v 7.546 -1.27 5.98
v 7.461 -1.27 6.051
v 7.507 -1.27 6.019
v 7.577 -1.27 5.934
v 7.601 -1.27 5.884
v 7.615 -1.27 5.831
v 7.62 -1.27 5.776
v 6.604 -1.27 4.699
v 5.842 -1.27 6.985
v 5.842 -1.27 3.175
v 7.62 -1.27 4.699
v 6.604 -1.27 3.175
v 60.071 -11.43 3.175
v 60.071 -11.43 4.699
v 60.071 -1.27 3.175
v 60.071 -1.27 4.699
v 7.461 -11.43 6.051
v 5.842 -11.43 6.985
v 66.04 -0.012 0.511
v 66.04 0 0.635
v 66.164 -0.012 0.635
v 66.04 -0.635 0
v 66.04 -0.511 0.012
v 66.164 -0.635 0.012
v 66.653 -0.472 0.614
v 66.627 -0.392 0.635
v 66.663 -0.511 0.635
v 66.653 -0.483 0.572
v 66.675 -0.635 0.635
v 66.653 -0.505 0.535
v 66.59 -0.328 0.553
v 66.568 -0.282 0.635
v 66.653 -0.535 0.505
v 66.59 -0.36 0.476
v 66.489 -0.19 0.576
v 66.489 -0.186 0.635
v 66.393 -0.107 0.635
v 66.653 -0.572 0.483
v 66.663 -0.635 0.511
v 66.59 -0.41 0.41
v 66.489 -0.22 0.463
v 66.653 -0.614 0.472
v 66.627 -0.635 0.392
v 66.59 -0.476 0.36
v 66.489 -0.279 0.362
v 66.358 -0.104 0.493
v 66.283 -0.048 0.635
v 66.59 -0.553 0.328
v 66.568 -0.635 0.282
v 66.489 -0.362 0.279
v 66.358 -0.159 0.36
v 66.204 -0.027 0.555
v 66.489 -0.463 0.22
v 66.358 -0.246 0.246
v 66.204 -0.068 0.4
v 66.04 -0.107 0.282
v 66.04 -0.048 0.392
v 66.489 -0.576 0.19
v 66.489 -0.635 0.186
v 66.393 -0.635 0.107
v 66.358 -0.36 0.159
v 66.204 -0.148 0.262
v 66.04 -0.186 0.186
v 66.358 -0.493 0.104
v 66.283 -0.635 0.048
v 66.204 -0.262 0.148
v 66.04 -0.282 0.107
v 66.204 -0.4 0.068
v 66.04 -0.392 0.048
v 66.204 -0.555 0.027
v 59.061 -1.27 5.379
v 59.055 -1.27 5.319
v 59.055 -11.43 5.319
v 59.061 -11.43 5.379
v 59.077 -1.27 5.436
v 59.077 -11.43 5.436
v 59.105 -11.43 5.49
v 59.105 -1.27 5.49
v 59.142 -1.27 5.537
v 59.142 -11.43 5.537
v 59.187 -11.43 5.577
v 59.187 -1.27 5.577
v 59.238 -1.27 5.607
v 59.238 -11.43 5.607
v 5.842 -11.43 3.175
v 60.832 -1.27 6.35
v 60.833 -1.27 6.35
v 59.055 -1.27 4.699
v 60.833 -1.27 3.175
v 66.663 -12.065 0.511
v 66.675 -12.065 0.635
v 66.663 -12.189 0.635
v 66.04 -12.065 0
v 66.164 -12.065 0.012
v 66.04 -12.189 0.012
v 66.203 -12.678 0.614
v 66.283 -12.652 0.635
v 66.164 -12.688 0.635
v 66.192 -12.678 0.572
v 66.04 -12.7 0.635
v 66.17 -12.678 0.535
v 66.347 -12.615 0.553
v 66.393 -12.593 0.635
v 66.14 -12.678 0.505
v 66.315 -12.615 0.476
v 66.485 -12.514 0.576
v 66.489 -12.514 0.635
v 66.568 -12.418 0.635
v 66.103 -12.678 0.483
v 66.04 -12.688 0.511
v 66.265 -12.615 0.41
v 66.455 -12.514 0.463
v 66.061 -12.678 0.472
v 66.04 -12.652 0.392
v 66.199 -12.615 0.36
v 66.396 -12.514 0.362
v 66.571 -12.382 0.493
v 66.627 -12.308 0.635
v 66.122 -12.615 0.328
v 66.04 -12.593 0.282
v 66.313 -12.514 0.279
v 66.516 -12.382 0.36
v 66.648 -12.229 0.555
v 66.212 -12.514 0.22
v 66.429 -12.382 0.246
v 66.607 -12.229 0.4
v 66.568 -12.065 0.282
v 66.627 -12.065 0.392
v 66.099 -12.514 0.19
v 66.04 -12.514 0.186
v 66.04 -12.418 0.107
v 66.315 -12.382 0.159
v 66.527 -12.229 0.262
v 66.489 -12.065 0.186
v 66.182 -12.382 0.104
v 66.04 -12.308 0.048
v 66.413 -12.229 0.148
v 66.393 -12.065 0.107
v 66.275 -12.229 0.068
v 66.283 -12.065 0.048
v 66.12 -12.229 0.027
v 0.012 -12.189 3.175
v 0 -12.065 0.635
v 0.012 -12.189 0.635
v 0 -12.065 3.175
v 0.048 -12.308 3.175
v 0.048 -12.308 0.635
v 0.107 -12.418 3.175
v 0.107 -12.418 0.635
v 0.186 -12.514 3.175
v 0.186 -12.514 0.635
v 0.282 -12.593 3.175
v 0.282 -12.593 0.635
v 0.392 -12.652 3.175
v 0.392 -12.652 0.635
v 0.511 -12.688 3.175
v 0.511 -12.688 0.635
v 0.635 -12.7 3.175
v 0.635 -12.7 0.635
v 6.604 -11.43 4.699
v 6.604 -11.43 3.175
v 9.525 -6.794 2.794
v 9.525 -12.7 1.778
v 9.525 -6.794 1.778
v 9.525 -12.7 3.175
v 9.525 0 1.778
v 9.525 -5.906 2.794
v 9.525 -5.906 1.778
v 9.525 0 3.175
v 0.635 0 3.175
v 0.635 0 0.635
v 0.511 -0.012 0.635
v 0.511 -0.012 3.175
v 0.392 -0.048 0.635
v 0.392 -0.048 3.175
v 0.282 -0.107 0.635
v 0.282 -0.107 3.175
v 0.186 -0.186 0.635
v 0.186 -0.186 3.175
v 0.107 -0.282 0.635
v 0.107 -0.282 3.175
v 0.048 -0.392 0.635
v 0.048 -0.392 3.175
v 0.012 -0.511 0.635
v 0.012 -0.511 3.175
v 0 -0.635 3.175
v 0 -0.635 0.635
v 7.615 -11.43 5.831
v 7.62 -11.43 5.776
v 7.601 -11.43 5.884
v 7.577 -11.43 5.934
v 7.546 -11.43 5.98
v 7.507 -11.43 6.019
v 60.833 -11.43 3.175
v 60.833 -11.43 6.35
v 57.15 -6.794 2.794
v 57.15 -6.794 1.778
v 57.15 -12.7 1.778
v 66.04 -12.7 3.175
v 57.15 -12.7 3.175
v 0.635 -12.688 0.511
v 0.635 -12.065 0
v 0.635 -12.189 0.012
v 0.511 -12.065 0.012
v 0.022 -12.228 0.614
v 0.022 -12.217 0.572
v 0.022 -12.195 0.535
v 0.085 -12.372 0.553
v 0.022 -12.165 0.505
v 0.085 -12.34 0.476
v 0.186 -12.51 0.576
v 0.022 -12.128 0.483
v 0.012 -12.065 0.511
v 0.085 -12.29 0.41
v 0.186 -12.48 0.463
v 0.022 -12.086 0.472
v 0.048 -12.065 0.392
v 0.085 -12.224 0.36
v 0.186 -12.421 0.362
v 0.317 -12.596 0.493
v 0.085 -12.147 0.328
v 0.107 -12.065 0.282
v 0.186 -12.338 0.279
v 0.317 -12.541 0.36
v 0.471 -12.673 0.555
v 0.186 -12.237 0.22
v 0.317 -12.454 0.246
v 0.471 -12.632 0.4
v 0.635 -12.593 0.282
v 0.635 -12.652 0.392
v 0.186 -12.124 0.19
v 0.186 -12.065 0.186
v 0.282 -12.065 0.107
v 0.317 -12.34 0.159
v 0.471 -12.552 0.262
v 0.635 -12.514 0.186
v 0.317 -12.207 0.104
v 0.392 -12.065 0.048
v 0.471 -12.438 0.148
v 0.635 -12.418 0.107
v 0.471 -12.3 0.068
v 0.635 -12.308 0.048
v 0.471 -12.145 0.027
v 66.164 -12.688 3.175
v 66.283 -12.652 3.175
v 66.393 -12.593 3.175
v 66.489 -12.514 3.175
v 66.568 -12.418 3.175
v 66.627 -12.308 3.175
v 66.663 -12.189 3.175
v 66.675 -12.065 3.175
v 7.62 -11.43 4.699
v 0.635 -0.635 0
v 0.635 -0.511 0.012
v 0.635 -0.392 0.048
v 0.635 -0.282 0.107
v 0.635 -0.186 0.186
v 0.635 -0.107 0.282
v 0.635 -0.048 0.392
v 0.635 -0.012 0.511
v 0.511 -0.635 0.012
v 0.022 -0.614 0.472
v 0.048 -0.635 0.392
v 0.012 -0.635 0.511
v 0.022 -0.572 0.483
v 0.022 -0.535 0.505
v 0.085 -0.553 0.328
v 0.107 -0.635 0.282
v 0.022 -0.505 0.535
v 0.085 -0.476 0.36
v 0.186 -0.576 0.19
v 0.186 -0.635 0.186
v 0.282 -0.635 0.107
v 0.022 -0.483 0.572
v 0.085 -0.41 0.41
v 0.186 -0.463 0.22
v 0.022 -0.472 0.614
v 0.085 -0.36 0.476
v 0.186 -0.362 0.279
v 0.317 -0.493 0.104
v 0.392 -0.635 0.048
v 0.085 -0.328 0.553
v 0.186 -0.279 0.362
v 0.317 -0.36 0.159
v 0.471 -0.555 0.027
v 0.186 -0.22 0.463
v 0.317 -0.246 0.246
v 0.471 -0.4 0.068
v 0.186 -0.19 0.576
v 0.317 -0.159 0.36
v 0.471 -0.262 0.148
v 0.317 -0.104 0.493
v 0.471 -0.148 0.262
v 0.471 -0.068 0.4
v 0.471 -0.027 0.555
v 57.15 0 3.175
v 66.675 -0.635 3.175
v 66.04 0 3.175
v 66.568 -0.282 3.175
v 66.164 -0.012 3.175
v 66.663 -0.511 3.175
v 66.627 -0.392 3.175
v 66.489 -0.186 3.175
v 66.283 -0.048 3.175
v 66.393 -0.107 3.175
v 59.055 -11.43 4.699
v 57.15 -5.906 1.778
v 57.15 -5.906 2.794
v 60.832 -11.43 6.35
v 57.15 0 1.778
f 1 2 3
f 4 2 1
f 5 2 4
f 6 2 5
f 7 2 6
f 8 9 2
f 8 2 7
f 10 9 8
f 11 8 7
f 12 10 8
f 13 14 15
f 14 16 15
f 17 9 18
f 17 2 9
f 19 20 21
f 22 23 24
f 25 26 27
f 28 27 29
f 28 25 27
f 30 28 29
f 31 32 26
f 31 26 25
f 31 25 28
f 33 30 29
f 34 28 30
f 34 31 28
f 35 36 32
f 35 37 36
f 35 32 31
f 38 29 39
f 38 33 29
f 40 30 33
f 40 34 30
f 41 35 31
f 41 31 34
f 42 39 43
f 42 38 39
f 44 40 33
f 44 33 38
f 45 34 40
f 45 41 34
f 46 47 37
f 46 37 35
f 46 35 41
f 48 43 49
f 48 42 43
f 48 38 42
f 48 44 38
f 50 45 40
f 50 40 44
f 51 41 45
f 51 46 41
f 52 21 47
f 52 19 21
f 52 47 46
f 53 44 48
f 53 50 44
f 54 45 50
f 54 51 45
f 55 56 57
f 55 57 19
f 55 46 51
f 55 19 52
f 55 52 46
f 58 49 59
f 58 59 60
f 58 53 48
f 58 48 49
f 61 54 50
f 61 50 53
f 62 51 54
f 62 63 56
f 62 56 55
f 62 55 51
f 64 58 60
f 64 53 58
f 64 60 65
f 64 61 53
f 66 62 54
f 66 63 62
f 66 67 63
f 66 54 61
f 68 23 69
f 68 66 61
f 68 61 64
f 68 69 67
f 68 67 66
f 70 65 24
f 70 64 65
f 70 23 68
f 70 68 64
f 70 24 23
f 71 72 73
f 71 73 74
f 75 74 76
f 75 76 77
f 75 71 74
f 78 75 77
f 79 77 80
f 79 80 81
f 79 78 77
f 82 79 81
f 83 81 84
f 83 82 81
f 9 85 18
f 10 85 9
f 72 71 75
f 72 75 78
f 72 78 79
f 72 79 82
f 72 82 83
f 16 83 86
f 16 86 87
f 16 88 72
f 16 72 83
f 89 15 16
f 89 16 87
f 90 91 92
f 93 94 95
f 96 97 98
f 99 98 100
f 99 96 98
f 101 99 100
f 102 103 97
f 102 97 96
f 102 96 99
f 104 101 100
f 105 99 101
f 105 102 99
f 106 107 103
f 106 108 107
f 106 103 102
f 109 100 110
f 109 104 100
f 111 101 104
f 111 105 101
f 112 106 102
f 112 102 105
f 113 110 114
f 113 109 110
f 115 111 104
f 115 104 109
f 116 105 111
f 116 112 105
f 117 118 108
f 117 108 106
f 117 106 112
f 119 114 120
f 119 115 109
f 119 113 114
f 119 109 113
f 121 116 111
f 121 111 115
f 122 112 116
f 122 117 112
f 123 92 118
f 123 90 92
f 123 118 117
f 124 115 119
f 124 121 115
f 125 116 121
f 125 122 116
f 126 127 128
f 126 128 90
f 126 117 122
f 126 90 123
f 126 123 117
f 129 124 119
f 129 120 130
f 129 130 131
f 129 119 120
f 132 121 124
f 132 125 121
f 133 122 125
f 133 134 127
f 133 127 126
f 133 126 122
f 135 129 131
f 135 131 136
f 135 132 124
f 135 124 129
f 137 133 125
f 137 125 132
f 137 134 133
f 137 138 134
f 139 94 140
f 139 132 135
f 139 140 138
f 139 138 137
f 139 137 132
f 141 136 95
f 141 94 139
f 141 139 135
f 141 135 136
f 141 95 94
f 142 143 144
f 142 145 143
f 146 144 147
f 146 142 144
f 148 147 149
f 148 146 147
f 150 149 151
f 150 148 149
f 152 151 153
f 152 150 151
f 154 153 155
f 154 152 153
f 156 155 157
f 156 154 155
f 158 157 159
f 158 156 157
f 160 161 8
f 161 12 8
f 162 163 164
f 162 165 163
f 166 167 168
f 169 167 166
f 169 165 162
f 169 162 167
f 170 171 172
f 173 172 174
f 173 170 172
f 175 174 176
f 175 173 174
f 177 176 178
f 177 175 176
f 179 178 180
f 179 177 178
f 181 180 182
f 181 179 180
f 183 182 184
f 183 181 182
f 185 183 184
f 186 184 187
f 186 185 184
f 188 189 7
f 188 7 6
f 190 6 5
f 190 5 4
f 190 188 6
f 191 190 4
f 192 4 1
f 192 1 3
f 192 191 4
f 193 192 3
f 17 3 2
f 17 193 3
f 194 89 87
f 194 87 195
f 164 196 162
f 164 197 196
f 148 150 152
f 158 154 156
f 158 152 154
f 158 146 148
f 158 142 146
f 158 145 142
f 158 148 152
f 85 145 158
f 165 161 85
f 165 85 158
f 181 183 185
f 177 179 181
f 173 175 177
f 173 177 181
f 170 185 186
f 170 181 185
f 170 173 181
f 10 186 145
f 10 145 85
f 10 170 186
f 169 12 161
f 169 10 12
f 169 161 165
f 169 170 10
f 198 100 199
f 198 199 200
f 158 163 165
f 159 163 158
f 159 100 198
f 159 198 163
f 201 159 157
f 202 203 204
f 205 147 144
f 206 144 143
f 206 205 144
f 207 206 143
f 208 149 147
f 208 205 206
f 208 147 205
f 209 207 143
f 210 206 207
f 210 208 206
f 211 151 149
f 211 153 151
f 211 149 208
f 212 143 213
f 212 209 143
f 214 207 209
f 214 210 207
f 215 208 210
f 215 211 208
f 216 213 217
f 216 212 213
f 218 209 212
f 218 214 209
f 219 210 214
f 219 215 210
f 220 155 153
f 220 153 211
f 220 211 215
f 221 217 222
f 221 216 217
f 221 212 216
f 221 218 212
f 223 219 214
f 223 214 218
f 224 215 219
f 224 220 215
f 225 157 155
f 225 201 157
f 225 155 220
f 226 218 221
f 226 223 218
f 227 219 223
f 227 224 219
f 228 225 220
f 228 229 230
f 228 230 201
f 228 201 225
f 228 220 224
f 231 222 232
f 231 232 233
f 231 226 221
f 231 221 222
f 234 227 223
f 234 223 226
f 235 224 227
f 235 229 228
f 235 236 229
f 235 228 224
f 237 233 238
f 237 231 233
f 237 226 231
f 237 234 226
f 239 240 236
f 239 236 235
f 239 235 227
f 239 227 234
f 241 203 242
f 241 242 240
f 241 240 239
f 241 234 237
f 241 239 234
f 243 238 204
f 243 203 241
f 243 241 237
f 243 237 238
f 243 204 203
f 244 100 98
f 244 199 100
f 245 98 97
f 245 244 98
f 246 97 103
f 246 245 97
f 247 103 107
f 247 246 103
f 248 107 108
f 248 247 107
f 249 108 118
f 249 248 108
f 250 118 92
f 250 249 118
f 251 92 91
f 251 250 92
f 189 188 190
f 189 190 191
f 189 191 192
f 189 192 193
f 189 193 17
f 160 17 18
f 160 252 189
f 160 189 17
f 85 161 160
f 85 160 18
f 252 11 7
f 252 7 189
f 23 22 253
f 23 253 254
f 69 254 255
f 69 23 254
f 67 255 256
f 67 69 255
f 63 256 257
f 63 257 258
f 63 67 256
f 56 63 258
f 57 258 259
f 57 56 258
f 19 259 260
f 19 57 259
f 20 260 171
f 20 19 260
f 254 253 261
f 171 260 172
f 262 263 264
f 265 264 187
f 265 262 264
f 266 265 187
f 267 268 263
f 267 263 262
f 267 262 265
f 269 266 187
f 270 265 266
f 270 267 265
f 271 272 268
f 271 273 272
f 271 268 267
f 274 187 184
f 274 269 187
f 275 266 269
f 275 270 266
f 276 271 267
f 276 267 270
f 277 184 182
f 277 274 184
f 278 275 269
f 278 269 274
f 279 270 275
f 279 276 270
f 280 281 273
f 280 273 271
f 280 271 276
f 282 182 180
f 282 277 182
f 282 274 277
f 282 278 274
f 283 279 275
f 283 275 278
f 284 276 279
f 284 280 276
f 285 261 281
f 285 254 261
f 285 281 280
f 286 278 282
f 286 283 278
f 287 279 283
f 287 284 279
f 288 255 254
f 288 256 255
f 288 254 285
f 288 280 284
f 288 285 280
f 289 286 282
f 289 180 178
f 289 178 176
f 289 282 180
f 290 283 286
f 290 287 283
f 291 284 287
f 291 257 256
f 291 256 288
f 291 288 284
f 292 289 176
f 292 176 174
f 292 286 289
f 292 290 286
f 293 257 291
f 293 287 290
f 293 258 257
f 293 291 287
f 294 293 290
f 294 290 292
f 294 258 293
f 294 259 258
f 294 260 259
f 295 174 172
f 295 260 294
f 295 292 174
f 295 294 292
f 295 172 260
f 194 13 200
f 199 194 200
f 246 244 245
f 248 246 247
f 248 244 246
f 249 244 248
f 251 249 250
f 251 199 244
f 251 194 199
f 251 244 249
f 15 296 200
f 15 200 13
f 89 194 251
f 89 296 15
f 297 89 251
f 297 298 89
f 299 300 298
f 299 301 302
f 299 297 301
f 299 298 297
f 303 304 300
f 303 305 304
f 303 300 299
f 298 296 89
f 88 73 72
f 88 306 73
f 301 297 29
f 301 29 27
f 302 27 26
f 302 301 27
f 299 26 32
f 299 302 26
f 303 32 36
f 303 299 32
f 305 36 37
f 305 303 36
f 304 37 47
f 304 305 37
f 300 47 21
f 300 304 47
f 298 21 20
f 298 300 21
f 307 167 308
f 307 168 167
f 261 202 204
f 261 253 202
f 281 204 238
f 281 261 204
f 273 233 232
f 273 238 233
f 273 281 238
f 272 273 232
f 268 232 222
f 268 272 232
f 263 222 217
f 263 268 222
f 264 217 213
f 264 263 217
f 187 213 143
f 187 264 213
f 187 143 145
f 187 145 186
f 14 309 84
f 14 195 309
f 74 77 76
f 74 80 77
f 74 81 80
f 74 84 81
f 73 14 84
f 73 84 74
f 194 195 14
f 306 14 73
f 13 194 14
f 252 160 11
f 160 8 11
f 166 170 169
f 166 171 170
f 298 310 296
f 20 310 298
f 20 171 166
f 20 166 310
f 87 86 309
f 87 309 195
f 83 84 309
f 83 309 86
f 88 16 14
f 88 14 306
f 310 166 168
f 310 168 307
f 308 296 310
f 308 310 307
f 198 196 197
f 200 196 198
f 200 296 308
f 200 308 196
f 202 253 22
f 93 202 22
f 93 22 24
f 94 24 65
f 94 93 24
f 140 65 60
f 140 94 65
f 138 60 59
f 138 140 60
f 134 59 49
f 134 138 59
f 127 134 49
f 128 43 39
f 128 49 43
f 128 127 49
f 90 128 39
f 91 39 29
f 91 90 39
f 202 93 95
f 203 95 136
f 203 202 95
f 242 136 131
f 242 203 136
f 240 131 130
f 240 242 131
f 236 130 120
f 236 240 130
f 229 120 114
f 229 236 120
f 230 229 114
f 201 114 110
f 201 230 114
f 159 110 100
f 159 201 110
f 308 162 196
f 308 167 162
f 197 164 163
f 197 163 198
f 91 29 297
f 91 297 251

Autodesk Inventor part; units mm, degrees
ref_plane "YZ Plane" through (0, 0, 0) normal (1, 0, 0) x (0, 1, 0)
ref_plane "XZ Plane" through (0, 0, 0) normal (0, 1, 0) x (-1, 0, 0)
ref_plane "XY Plane" through (0, 0, 0) normal (0, 0, 1) x (1, 0, 0)
sketch "Sketch1" plane through (0, 0, 0) normal (0, 0, 1) x (1, 0, 0)
  line L0 (0, 0) -> (66.675, 0)
  line L1 (66.675, 0) -> (66.675, -12.7)
  line L2 (66.675, -12.7) -> (0, -12.7)
  line L3 (0, -12.7) -> (0, 0)
  dimension "d0" = 66.675
  dimension "d1" = 12.7
extrude "Extrusion1" add sketch "Sketch1" along normal blind 3.175
fillet "Fillet1" radius 0.635 8 edges at (33.3375, 0, 0) (66.675, -6.35, 0) (66.675, 0, 1.5875) (33.3375, -12.7, 0) (66.675, -12.7, 1.5875) (0, -6.35, 0) (0, -12.7, 1.5875) (0, 0, 1.5875)
sketch "Sketch2" plane through (0, 0, 3.175) normal (0, 0, 1) x (1, 0, 0)
  line L0 (66.04, 0) -> (0.635, 0) projected
  line L1 (0.635, -12.7) -> (66.04, -12.7) projected
  line L2 (9.525, 0) -> (57.15, 0)
  line L3 (57.15, 0) -> (57.15, -12.7)
  line L4 (57.15, -12.7) -> (9.525, -12.7)
  line L5 (9.525, -12.7) -> (9.525, 0)
  line L6 (66.675, -12.065) -> (66.675, -0.635) projected
  point P0 (0, 0)
  dimension "d5" = 47.625
  dimension "d6" = 9.525
extrude "Extrusion2" cut sketch "Sketch2" against normal blind 1.397
sketch "Sketch3" plane through (0, 0, 3.175) normal (0, 0, 1) x (1, 0, 0)
  line L0 (66.04, -0.635) -> (0.635, -0.635) projected
  line L1 (0.635, -12.065) -> (66.04, -12.065) projected
  line L2 (5.842, -1.27) -> (7.62, -1.27)
  line L3 (7.62, -1.27) -> (7.62, -11.43)
  line L4 (7.62, -11.43) -> (5.842, -11.43)
  line L5 (5.842, -11.43) -> (5.842, -1.27)
  line L6 (9.525, -12.7) -> (9.525, 0) projected
  line L7 (7.112, -1.101) -> (5.842, -11.4757)
  line L8 (5.842, -11.4757) -> (8.89, -11.4757)
  line L9 (8.89, -11.4757) -> (7.62, -21.8503)
  line L10 (9.525, 0) -> (0.635, 0) projected
  line L11 (0.635, -12.7) -> (9.525, -12.7) projected
  point P0 (0, 0)
  dimension "d9" = 1.778
  dimension "d52" = 1.27
  dimension "d53" = 1.27
  dimension "d56" = 1.905
extrude "Extrusion3" add sketch "Sketch3" along normal blind 3.81 contours L4 L5 L2 L7 | L7 L2 L3 L4
sketch "Sketch5" plane through (0, 0, 3.175) normal (0, 0, 1) x (1, 0, 0)
  line L0 (66.04, -0.635) -> (0.635, -0.635) projected
  line L1 (0.635, -12.065) -> (66.04, -12.065) projected
  line L2 (59.055, -1.27) -> (60.833, -1.27)
  line L3 (60.833, -1.27) -> (60.833, -11.43)
  line L4 (60.833, -11.43) -> (59.055, -11.43)
  line L5 (59.055, -11.43) -> (59.055, -1.27)
  line L6 (57.15, 0) -> (57.15, -12.7) projected
  line L7 (66.04, 0) -> (57.15, 0) projected
  line L8 (57.15, -12.7) -> (66.04, -12.7) projected
  point P0 (0, 0)
  dimension "d21" = 1.778
  dimension "d54" = 1.27
  dimension "d55" = 1.27
  dimension "d57" = 1.905
extrude "Extrusion5" add sketch "Sketch5" along normal blind 3.175
sketch "Sketch6" plane through (59.055, -1.27, 3.175) normal (0, 1, 0) x (1, 0, 0)
  line L0 (0, 0) -> (1.778, 0) projected
  line L1 (1.016, -1.524) -> (1.016, 0)
  line L2 (1.016, 0) -> (0, 0)
  line L3 (0, 0) -> (0, -1.524)
  line L4 (0, 0) -> (0, -3.175) projected
  line L5 (0, 0) -> (1.016, 0)
  line L6 (1.016, 0) -> (1.016, -1.524)
  line L7 (1.016, -1.524) -> (0, -1.524)
  line L8 (0, -1.524) -> (0, 0)
  point P0 (-59.055, 3.175)
  point P1 (0, -1.524)
  dimension "d29" = 1.016
  dimension "d51" = 1.524
extrude "Extrusion6" cut sketch "Sketch6" against normal through all
sketch "Sketch7" plane through (0, 0, 1.778) normal (0, 0, 1) x (1, 0, 0)
  line L0 (9.525, -12.7) -> (9.525, 0) projected
  line L1 (57.15, 0) -> (57.15, -12.7) projected
  line L2 (9.525, -5.9055) -> (57.15, -5.9055)
  line L3 (57.15, -5.9055) -> (57.15, -6.7945)
  line L4 (57.15, -6.7945) -> (9.525, -6.7945)
  line L5 (9.525, -6.7945) -> (9.525, -5.9055)
  line L6 (9.525, 0) -> (57.15, 0) projected
  point P0 (0, 0)
  dimension "d33" = 0.889
  dimension "d34" = 5.9055
extrude "Extrusion7" add sketch "Sketch7" along normal blind 1.016 contours L0 L2 L1 L4
sketch "Sketch8" plane through (5.842, -1.27, 3.175) normal (0, 1, 0) x (1, 0, 0)
  line L0 (0, 0) -> (1.778, 0) projected
  line L1 (1.778, 0) -> (0.762, 0)
  line L2 (0.762, 0) -> (0.762, -1.524)
  line L3 (0.762, -1.524) -> (1.778, -1.524)
  line L4 (1.778, -1.524) -> (1.778, 0)
  point P0 (-5.842, 3.175)
  dimension "d38" = 1.016
  dimension "d39" = 1.524
extrude "Extrusion8" cut sketch "Sketch8" against normal through all
chamfer "Chamfer3" distance 1.778 angle 30 1 edges at (7.62, -6.35, 6.985) measured on face at (6.4347, -4.6567, 6.985)
fillet "Fillet4" radius 0.3175 1 edges at (7.62, -6.35, 5.959)
chamfer "Chamfer4" distance 1.778 angle 25 1 edges at (59.055, -6.35, 6.35) measured on face at (59.6477, -4.6567, 6.35)
fillet "Fillet5" radius 0.3175 1 edges at (59.055, -6.35, 5.5214)
properties part number "ClipMale"
